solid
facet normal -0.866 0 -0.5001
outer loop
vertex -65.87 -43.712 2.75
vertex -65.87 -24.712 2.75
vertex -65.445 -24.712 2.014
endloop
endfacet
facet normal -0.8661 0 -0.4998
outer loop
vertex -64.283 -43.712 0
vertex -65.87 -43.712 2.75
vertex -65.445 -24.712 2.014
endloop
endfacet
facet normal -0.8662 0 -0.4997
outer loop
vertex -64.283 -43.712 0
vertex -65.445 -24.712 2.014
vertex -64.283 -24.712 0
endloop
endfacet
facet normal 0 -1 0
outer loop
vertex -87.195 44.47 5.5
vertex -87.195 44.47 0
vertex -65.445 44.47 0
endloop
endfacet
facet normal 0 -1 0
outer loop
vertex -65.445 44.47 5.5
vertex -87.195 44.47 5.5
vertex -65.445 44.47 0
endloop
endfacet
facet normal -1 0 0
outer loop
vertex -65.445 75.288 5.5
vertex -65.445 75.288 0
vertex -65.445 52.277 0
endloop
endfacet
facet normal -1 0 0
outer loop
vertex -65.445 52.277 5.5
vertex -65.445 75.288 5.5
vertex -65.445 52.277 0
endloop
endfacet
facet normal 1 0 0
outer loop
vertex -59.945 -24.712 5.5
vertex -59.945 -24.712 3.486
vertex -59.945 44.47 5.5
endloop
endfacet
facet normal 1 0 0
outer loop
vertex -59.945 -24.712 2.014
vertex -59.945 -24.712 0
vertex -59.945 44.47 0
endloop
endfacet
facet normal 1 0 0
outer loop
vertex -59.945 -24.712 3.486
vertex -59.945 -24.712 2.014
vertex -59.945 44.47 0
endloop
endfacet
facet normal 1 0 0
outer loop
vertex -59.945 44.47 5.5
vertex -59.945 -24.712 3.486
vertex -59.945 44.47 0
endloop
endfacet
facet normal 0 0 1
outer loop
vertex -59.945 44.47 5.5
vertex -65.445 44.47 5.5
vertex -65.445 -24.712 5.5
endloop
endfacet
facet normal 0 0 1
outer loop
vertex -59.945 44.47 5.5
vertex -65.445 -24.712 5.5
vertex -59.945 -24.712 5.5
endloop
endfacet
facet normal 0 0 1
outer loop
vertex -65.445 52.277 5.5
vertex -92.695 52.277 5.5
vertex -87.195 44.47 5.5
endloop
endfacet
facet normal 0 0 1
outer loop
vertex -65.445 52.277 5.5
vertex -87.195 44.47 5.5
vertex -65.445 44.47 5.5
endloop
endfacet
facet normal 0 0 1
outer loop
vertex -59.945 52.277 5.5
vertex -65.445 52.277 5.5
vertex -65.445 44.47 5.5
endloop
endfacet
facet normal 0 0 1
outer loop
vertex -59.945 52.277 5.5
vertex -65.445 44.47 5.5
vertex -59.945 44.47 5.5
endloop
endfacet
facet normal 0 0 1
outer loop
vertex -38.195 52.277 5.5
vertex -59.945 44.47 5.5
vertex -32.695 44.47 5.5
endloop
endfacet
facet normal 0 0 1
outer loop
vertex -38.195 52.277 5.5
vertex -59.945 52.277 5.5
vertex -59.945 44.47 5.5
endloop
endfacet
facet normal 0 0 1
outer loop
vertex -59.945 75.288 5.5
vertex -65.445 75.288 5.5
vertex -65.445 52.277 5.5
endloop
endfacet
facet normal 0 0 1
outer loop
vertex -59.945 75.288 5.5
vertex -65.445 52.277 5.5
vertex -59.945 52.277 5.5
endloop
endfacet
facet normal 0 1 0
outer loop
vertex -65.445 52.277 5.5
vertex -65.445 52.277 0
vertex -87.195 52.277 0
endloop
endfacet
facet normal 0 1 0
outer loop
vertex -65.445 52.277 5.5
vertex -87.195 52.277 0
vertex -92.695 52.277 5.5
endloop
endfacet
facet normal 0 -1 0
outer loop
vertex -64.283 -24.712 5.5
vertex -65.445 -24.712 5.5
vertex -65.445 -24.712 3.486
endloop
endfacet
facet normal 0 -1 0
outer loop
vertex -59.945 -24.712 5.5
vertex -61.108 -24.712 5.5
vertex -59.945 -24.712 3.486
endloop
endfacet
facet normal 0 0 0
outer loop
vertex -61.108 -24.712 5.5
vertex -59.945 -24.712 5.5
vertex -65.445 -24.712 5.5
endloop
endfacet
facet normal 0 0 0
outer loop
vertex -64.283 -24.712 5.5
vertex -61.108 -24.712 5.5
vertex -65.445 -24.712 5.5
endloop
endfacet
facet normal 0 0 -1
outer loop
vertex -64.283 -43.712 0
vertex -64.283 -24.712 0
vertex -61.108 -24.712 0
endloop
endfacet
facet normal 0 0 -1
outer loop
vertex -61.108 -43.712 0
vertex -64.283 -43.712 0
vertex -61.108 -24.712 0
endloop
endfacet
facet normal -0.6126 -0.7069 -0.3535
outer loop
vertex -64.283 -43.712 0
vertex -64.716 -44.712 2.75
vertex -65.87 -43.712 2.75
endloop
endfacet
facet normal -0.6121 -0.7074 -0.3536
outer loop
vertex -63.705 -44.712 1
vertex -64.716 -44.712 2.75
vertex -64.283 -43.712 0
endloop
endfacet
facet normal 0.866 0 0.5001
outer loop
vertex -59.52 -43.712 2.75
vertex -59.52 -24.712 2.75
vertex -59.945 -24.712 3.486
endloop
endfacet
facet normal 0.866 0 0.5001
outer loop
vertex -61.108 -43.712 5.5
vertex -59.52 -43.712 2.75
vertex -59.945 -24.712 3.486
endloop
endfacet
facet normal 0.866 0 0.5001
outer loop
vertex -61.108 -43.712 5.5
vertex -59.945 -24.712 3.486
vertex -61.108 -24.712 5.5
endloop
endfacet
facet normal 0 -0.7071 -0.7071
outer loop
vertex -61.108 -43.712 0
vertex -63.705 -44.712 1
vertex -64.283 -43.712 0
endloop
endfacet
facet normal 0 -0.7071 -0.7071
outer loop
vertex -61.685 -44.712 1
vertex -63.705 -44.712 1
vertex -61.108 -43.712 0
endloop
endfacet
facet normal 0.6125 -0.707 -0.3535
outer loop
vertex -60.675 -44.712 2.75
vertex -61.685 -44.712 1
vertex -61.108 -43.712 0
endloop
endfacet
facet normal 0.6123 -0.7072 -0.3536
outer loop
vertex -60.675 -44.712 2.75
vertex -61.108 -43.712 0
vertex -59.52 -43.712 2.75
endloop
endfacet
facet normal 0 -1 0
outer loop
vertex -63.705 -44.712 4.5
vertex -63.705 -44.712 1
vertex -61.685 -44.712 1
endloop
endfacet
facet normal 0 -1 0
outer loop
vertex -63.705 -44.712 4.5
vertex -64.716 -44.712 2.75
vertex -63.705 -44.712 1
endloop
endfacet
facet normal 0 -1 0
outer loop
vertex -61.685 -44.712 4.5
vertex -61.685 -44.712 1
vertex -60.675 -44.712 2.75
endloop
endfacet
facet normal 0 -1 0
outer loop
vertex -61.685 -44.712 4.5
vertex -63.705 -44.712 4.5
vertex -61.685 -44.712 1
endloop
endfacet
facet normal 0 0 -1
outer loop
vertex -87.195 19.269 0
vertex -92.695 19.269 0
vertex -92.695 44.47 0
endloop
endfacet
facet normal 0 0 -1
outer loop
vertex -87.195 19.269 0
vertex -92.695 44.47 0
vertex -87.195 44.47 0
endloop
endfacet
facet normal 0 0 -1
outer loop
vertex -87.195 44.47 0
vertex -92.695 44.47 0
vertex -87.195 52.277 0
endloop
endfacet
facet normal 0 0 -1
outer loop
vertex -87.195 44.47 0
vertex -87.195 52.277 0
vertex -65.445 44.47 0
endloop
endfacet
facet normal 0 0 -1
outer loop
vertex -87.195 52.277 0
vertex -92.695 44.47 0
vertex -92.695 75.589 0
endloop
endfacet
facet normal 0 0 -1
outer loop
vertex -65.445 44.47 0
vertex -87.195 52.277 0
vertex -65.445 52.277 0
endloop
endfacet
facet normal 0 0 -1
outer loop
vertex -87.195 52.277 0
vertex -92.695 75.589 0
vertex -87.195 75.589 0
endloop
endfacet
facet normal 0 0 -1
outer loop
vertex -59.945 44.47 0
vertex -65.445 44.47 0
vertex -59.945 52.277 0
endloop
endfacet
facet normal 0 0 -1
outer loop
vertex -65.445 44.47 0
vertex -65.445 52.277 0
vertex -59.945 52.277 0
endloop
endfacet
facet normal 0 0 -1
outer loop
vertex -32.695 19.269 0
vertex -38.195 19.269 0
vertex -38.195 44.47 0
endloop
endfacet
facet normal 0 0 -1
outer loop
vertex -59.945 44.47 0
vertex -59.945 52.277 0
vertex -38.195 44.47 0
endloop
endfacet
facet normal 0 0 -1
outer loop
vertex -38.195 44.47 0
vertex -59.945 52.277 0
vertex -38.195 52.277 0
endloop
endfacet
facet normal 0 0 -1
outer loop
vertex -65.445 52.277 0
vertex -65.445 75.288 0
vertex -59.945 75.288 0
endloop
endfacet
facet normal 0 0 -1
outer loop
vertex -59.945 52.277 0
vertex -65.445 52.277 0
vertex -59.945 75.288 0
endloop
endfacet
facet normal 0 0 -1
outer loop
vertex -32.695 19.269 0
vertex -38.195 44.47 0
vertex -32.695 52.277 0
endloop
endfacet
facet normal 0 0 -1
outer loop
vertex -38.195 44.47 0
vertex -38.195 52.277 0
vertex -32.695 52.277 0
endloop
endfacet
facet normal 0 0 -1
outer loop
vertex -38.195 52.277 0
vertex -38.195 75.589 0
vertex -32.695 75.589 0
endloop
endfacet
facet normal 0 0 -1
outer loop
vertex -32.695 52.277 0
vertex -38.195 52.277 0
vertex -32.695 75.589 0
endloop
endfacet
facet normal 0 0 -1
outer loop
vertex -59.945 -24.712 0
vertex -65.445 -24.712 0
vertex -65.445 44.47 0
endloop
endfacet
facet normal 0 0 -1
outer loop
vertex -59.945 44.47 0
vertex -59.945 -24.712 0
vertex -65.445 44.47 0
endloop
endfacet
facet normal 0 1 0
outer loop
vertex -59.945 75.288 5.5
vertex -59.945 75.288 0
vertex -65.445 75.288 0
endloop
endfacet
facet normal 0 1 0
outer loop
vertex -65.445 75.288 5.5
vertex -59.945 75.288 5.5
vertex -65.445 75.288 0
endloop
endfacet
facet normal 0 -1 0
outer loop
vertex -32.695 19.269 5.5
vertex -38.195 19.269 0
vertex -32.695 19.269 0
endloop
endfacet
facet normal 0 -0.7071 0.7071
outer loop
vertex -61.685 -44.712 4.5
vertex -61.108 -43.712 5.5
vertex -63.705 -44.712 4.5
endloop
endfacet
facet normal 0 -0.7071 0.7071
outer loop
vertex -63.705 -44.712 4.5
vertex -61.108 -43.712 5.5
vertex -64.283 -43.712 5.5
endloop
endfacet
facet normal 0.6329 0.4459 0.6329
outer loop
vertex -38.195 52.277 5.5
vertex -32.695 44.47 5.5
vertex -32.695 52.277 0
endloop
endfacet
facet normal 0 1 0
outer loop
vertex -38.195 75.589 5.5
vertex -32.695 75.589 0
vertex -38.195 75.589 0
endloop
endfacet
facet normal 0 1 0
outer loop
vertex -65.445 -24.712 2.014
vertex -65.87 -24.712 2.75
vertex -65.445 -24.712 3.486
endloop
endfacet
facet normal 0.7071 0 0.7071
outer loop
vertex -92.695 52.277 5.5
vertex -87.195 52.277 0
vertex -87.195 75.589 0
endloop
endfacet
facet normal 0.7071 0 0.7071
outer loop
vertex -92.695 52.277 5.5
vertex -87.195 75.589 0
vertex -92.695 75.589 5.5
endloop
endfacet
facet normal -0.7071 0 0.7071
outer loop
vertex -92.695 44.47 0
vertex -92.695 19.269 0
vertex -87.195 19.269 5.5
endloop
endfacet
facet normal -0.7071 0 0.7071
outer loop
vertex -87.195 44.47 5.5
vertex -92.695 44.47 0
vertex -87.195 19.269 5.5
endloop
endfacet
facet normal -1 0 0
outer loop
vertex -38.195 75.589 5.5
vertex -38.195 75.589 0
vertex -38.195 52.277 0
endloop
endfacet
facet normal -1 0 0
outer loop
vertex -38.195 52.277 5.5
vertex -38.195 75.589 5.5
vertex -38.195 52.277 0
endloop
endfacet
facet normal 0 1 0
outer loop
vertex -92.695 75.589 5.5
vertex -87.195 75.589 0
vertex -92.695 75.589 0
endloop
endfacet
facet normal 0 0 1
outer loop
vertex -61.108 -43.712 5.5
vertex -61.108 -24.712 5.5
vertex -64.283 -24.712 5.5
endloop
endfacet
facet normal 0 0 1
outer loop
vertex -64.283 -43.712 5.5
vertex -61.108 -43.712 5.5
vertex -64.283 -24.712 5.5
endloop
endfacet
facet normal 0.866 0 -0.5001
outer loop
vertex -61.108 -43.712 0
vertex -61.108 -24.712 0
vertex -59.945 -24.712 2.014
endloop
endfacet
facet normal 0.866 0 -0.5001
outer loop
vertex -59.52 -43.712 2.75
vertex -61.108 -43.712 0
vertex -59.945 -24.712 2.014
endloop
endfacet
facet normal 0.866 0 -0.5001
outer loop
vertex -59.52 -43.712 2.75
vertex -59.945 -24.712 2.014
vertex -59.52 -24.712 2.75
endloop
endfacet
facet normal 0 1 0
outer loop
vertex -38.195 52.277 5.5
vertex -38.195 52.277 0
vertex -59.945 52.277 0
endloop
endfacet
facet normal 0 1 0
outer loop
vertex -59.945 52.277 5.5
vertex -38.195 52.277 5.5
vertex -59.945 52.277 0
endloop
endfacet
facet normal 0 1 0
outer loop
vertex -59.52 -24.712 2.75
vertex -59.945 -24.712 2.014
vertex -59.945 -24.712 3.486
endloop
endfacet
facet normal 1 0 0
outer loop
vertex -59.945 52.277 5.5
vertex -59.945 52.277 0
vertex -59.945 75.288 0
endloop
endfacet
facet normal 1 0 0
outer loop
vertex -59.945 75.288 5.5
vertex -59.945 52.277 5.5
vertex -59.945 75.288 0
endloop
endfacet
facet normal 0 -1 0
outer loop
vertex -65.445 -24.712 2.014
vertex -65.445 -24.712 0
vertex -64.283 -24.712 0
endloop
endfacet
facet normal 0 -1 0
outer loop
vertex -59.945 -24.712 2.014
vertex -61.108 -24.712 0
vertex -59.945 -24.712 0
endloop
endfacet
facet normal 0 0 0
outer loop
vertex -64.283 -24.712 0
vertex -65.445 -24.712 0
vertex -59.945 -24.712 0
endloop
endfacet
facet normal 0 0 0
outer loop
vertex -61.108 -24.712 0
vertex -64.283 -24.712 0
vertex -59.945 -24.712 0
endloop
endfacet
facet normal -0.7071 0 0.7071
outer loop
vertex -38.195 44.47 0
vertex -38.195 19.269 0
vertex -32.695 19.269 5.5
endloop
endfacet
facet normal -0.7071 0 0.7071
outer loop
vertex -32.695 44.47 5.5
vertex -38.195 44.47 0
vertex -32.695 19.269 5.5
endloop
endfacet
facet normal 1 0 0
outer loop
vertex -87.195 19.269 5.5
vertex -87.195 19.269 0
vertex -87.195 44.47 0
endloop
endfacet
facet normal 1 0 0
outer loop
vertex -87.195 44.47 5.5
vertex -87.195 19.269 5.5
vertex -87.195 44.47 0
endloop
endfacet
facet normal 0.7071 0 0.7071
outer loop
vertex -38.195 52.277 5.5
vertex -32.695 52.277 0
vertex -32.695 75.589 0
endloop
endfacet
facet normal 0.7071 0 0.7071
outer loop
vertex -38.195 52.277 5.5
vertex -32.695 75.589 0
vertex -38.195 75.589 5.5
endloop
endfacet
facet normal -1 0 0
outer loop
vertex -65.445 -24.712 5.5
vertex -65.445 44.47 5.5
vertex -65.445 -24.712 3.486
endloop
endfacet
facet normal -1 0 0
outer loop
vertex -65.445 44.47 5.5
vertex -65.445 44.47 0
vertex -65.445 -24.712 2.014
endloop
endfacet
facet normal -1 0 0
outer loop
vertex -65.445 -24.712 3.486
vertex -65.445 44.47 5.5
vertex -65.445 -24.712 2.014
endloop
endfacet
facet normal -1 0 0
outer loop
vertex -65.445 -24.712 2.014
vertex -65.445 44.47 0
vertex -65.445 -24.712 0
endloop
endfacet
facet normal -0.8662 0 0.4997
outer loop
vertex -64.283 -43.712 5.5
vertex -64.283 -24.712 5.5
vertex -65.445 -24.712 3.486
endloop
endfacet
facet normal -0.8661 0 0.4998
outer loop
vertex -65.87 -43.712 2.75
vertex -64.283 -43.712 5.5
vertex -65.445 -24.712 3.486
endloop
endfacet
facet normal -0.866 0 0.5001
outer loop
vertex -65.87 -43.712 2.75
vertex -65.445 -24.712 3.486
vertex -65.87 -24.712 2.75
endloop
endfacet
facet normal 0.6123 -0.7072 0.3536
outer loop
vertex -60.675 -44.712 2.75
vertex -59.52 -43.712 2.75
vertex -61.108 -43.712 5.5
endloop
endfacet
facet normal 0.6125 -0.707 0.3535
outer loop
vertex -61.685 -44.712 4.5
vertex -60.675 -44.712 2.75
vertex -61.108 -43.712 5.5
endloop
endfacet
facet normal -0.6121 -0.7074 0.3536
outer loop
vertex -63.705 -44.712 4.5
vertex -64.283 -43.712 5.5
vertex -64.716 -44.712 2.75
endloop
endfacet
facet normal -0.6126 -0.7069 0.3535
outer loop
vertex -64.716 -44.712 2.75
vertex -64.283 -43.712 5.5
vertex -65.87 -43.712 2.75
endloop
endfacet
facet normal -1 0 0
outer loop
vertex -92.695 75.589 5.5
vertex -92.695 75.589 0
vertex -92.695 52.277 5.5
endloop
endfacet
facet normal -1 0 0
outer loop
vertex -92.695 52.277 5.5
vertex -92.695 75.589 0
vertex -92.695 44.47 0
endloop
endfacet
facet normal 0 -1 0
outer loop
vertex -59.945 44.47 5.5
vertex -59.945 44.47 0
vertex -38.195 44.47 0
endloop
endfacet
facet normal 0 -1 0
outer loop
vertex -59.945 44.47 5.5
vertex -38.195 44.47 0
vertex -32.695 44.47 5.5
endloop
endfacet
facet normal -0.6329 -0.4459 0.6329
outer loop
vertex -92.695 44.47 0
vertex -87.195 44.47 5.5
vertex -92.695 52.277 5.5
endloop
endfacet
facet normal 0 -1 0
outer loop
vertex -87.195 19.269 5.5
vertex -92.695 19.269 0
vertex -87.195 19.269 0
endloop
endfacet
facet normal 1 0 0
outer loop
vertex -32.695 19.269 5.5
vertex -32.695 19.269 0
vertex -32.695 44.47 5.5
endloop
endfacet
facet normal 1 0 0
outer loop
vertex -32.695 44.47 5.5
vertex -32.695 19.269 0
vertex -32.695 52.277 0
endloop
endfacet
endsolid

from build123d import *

# Parameters (mm, degrees)
F2_DEPTH  = 5.5
F4_DEPTH  = 20
F5_SIZE   = 1
F7_DEPTH  = 25.2006128335
F9_DEPTH  = 23.3118180281
F12_DEPTH = 3.481088538
F15_DEPTH = 3.4810885381


with BuildPart() as f2:
    # F1 (on Top) → F2 (new body)
    with BuildSketch(Plane.XY):
        Polygon((-59.9452278197, 75.287711217), (-65.4452278197, 75.287711217), (-65.4452278197, 52.2770658135), (-87.1952278197, 52.2770658135), (-87.1952278197, 75.5888838416), (-92.6952278197, 75.5888838416), (-92.6952278197, 19.2692689693), (-87.1952278197, 19.2692689693), (-87.1952278197, 44.4698818028), (-65.4452278197, 44.4698818028), (-65.4452278197, -24.712288783), (-59.9452278197, -24.712288783), (-59.9452278197, 44.4698818028), (-38.1952278197, 44.4698818028), (-38.1952278197, 19.2692689693), (-32.6952278197, 19.2692689693), (-32.6952278197, 75.5888838416), (-38.1952278197, 75.5888838416), (-38.1952278197, 52.2770658135), (-59.9452278197, 52.2770658135), align=None)
    extrude(amount=F2_DEPTH)

    # F3 (on face) → F4 (join)
    with BuildSketch(Plane.XZ.offset(24.712288783)):
        Polygon((-64.2827278197, 0.000369343), (-61.1077278197, 0.000369343), (-59.5202278197, 2.75), (-61.1077278197, 5.499630657), (-64.2827278197, 5.499630657), (-65.8702278197, 2.75), align=None)
    extrude(amount=F4_DEPTH)

    # F5
    f5_edges = [f2.edges().sort_by_distance(p)[0] for p in [
        (-62.695228, -44.712289, 0.000369),
        (-60.313978, -44.712289, 1.375185),
        (-60.313978, -44.712289, 4.124815),
        (-62.695228, -44.712289, 5.499631),
        (-65.076478, -44.712289, 4.124815),
        (-65.076478, -44.712289, 1.375185),
    ]]
    chamfer(f5_edges, length=F5_SIZE)

    # F6 (on face) → F7 (cut, through all)
    with BuildSketch(Plane.XZ.offset(-19.2692689693)):
        Polygon((-38.1952278197, 5.5), (-38.1952278197, 0), (-32.6952278197, 5.5), align=None)
        Polygon((-92.6952278197, 5.5), (-92.6952278197, 0), (-87.1952278197, 5.5), align=None)
    extrude(amount=-F7_DEPTH, mode=Mode.SUBTRACT)

    # F8 (on face) → F9 (cut, through all)
    with BuildSketch(Plane(origin=(0, 75.5888838416, 0), x_dir=(-1, 0, 0), z_dir=(0, 1, 0))):
        Polygon((32.6952278197, 0), (38.1952278197, 5.5), (32.6952278197, 5.5), align=None)
        Polygon((87.1952278197, 0), (92.6952278197, 5.5), (87.1952278197, 5.5), align=None)
    extrude(amount=-F9_DEPTH, mode=Mode.SUBTRACT)

    # F11 (on 3pt) → F12 (cut, through all)
    with BuildSketch(Plane(origin=(1.6556105831, 1.166343485, 1.6556105831), x_dir=(-0.3152867036, 0.8950913859, -0.3152867036), z_dir=(0.6329251887, 0.4458827323, 0.6329251887))):
        Polygon((57.1011218912, 30.8971918968), (48.3789018654, 27.0081046003), (57.1011218912, 23.1190173037), align=None)
    extrude(amount=F12_DEPTH, mode=Mode.SUBTRACT)

    # F14 (on 3pt) → F15 (cut, through all)
    with BuildSketch(Plane(origin=(-24.583315709, -17.3184385322, 24.5833157086), x_dir=(-0.3152867036, 0.8950913859, 0.3152867036), z_dir=(0.6329251887, 0.4458827323, -0.6329251887))):
        Polygon((69.0301809517, -65.5454241745), (77.7524009774, -61.6563368779), (69.0301809516, -57.7672495814), align=None)
    extrude(amount=-F15_DEPTH, mode=Mode.SUBTRACT)


solid = f2.part
